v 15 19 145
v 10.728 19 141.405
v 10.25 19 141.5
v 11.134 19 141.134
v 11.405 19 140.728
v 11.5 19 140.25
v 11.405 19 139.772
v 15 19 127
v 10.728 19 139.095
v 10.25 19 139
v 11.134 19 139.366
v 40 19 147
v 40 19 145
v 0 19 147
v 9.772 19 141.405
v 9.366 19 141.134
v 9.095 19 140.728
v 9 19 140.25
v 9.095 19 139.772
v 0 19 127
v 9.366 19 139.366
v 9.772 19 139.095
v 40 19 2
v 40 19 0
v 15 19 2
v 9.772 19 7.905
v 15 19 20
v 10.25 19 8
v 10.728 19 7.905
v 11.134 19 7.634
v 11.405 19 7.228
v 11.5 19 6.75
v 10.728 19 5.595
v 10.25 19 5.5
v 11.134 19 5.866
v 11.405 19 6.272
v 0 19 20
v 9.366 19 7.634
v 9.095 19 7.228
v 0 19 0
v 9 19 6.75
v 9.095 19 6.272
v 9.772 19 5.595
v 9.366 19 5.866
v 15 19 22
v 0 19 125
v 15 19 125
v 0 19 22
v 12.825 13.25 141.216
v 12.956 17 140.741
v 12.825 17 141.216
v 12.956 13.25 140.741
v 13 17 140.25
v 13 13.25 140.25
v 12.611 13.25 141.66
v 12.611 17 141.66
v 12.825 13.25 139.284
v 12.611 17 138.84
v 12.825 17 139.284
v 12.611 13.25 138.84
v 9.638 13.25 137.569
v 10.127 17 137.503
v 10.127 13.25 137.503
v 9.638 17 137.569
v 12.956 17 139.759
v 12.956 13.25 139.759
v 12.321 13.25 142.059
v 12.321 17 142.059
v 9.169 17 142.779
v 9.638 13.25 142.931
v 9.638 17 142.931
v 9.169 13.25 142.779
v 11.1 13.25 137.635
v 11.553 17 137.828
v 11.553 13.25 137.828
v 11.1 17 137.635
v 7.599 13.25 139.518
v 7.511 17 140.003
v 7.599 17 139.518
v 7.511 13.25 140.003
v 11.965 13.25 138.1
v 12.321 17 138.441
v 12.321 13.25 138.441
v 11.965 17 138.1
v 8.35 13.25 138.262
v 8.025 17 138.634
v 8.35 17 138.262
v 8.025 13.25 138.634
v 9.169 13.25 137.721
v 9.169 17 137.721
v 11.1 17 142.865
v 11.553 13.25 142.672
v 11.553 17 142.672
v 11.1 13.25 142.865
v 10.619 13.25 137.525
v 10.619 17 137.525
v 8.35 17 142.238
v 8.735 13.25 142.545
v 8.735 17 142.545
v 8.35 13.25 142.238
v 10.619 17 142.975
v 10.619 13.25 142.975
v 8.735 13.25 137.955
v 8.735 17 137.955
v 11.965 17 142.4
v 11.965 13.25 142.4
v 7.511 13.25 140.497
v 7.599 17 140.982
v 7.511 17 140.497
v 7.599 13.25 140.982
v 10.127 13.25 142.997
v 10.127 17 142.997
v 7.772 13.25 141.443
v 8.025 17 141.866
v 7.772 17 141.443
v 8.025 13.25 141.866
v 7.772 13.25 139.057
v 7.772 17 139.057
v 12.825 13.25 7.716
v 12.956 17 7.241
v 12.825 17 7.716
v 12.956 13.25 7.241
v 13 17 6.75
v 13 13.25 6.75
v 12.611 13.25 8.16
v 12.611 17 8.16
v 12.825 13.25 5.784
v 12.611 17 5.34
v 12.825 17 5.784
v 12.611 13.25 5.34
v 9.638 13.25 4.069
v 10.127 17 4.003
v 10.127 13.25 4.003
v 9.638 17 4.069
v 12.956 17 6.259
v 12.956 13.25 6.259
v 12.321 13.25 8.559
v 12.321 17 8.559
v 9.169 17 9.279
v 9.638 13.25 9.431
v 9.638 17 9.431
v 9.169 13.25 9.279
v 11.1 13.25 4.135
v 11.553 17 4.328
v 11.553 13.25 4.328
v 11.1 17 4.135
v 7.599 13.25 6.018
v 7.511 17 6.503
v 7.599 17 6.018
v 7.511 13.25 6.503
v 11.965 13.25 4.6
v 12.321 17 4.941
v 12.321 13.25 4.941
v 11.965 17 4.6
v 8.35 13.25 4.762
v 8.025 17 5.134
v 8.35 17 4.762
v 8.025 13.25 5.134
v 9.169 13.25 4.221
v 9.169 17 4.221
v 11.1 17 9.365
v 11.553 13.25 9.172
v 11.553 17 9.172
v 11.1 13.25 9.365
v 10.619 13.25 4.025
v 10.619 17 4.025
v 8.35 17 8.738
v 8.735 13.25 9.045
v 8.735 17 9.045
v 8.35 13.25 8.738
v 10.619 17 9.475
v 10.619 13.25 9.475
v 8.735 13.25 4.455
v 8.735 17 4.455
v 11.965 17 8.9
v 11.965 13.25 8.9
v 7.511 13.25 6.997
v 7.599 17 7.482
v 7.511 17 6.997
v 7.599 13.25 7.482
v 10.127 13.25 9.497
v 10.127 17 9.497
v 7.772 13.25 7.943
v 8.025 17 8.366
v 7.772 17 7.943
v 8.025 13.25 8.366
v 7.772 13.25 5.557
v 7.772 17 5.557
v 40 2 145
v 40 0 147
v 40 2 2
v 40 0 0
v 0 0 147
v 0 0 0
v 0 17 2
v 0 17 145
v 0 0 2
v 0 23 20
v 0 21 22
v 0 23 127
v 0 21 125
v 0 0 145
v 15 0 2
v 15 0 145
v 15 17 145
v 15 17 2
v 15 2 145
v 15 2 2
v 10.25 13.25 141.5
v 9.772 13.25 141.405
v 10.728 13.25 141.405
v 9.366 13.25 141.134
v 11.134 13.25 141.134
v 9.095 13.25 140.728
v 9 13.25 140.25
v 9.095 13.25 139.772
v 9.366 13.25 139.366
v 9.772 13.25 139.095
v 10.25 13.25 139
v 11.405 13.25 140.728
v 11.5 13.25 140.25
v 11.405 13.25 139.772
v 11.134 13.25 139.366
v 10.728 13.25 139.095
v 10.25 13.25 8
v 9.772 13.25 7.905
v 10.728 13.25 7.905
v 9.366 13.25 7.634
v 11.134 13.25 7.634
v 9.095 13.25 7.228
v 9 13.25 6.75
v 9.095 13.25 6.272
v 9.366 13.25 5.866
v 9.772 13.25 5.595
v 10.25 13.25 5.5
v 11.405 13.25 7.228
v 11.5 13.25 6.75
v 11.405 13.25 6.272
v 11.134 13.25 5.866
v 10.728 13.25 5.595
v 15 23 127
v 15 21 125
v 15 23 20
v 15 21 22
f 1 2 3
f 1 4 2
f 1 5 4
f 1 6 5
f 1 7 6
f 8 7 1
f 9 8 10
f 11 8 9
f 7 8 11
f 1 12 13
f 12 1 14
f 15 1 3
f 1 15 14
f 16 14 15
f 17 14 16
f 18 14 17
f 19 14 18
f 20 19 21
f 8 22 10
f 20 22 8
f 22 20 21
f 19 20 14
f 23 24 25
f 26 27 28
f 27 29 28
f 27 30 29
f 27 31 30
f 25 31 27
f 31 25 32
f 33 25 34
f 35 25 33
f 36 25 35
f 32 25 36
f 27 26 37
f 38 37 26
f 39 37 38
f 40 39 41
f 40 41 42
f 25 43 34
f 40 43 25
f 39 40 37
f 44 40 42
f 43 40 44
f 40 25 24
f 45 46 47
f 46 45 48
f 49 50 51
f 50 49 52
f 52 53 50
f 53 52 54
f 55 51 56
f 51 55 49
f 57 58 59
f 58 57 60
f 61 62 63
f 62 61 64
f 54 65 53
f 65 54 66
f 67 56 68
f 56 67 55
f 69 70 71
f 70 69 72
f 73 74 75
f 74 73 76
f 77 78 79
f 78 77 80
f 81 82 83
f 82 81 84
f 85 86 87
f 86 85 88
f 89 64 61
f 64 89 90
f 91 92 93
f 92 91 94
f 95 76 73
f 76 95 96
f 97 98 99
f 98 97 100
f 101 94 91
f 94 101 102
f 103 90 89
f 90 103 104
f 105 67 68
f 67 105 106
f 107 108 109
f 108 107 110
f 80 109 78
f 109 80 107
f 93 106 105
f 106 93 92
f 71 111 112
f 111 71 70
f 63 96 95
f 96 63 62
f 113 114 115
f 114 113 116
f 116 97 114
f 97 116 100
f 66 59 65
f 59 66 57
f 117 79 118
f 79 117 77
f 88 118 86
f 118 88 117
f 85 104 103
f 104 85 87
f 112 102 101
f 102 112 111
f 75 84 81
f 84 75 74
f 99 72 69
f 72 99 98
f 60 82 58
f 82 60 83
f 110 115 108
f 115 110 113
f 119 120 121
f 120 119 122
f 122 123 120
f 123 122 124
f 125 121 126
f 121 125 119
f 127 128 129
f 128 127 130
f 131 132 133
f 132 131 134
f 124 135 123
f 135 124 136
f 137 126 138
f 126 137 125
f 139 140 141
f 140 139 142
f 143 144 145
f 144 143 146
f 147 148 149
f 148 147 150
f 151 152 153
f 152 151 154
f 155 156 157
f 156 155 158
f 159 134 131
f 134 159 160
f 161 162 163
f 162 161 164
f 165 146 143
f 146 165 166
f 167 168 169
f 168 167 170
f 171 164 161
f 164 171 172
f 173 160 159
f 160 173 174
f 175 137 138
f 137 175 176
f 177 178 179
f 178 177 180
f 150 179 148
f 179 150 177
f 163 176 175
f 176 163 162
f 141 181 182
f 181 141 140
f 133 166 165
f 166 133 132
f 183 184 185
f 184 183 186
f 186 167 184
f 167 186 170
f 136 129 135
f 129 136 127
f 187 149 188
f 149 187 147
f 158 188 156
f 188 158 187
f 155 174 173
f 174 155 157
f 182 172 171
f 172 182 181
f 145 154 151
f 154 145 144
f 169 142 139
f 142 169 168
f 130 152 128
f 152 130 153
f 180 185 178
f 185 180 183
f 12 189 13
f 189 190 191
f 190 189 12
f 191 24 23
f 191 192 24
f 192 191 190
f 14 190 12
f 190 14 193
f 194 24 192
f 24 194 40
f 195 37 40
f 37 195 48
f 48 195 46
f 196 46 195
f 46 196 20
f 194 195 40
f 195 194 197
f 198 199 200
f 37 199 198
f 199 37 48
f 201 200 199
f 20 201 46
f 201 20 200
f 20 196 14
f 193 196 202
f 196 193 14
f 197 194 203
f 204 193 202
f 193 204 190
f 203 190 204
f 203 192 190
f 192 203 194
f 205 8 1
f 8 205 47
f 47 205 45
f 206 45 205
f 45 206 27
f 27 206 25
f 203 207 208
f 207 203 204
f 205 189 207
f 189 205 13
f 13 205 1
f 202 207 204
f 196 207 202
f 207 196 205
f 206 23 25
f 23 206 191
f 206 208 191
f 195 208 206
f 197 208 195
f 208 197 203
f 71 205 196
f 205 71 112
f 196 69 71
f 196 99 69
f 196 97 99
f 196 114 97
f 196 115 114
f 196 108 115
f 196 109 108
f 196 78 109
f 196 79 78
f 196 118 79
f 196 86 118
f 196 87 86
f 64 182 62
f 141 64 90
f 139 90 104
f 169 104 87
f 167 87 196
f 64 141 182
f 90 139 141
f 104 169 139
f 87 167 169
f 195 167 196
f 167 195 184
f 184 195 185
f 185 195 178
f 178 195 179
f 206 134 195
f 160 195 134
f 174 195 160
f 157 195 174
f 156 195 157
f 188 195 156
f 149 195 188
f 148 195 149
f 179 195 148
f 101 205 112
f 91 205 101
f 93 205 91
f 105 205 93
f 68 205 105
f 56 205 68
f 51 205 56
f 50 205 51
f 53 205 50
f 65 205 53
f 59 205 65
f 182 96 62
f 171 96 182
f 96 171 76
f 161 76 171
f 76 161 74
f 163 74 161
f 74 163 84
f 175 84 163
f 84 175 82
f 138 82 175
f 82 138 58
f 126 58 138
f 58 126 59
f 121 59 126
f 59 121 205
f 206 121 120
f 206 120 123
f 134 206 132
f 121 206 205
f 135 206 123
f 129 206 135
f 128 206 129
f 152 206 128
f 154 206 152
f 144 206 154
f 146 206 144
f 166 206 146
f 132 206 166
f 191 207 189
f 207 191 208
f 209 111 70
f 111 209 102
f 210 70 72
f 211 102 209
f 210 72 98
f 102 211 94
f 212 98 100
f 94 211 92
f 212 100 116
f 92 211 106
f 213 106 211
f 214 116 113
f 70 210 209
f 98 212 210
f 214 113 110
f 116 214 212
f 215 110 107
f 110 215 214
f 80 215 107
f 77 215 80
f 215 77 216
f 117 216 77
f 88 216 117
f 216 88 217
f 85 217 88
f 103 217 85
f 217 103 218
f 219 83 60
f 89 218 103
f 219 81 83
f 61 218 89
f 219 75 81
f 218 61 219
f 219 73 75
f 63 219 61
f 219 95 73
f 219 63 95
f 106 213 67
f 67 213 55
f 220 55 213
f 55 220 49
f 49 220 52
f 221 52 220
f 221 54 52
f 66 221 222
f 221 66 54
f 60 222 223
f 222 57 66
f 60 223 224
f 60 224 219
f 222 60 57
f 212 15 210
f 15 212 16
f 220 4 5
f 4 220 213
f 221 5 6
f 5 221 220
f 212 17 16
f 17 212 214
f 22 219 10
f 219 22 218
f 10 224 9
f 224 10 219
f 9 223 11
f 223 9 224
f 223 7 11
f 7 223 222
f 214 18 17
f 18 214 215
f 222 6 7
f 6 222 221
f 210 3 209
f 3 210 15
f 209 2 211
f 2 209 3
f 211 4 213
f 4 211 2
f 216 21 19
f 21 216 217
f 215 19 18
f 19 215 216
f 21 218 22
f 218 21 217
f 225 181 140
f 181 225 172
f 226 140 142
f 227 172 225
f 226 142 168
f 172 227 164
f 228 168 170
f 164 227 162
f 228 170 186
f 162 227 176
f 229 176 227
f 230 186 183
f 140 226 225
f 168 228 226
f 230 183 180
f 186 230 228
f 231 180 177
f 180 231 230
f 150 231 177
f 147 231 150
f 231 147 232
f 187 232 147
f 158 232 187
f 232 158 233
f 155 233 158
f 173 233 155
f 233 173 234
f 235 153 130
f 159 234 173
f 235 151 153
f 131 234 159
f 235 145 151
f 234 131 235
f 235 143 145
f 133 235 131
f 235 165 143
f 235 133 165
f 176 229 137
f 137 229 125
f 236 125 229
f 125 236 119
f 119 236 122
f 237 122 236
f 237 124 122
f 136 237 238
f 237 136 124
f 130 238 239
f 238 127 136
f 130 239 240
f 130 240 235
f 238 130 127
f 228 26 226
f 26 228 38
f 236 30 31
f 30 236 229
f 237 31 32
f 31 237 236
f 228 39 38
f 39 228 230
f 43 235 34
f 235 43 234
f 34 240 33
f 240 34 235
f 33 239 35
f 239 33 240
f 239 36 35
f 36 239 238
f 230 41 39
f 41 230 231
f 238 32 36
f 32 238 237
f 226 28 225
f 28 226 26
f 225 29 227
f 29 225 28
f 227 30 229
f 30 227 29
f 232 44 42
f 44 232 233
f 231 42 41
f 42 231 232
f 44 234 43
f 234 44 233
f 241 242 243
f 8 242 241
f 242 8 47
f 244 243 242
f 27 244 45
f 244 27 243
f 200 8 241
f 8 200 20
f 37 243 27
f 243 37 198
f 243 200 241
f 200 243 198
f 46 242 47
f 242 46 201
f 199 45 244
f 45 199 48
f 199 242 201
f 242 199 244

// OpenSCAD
$fs = 0.5;
$fa = 0.5;

width = 40;
height = 147;
depth = 19;
screenSize = 15;
thickness = 2;

pegWidth = 2.75;
pegHeight = 3.75;
pegScrewSize = 1.25;
pegOffset = pegWidth + 2;

union() {
    sleeve(width, height, depth, screenSize, thickness);
    rotate([90, 0, 0]) {
            translate([screenSize-pegOffset, height-pegOffset-thickness, -depth]) peg(pegWidth, pegHeight+thickness, pegScrewSize);
            translate([screenSize-pegOffset, pegOffset+thickness, -depth]) peg(pegWidth, pegHeight+thickness, pegScrewSize);
    };
    translate([0, depth, CENTER(height, height-40)]) attachment(screenSize, height-40, 2*thickness, thickness);
}

module sleeve(width, height, depth, screenSize, thickness) {
    difference() {
        cube([width, depth, height]);

        translate([0,0,CENTER(height, height-thickness*2)]) cube([width - 25, depth - thickness, height - thickness*2]);

        translate([screenSize, thickness, CENTER(height, height-thickness*2)]) #cube([width - screenSize, depth - thickness, height - thickness*2]);

        rotate([90, 0, 0]) {
            translate([screenSize-pegOffset, height-pegOffset-thickness, -depth]) pegHole(pegWidth, pegHeight, pegScrewSize);
            translate([screenSize-pegOffset, pegOffset+thickness, -depth]) pegHole(pegWidth, pegHeight, pegScrewSize);
    };
    }
}

module attachment(width, height, depth, thickness) {
    difference() {
        cube([width, depth, height]);
        translate([0, 0, CENTER(height, height-thickness*2)]) cube([width, depth-thickness, height-thickness*2]);
    }
}

module peg(width, height, screwSize) {
    difference() {
        cylinder(r=width, h=height);
        cylinder(r=screwSize, h=height);
    }
}

module pegHole(width, height, screwSize) {
        cylinder(r=screwSize, h=height+1);
        cylinder(r=width, h=height);
}

function CENTER(parentCoordinate, childCoordinate) = 
    parentCoordinate / 2 - childCoordinate / 2;
